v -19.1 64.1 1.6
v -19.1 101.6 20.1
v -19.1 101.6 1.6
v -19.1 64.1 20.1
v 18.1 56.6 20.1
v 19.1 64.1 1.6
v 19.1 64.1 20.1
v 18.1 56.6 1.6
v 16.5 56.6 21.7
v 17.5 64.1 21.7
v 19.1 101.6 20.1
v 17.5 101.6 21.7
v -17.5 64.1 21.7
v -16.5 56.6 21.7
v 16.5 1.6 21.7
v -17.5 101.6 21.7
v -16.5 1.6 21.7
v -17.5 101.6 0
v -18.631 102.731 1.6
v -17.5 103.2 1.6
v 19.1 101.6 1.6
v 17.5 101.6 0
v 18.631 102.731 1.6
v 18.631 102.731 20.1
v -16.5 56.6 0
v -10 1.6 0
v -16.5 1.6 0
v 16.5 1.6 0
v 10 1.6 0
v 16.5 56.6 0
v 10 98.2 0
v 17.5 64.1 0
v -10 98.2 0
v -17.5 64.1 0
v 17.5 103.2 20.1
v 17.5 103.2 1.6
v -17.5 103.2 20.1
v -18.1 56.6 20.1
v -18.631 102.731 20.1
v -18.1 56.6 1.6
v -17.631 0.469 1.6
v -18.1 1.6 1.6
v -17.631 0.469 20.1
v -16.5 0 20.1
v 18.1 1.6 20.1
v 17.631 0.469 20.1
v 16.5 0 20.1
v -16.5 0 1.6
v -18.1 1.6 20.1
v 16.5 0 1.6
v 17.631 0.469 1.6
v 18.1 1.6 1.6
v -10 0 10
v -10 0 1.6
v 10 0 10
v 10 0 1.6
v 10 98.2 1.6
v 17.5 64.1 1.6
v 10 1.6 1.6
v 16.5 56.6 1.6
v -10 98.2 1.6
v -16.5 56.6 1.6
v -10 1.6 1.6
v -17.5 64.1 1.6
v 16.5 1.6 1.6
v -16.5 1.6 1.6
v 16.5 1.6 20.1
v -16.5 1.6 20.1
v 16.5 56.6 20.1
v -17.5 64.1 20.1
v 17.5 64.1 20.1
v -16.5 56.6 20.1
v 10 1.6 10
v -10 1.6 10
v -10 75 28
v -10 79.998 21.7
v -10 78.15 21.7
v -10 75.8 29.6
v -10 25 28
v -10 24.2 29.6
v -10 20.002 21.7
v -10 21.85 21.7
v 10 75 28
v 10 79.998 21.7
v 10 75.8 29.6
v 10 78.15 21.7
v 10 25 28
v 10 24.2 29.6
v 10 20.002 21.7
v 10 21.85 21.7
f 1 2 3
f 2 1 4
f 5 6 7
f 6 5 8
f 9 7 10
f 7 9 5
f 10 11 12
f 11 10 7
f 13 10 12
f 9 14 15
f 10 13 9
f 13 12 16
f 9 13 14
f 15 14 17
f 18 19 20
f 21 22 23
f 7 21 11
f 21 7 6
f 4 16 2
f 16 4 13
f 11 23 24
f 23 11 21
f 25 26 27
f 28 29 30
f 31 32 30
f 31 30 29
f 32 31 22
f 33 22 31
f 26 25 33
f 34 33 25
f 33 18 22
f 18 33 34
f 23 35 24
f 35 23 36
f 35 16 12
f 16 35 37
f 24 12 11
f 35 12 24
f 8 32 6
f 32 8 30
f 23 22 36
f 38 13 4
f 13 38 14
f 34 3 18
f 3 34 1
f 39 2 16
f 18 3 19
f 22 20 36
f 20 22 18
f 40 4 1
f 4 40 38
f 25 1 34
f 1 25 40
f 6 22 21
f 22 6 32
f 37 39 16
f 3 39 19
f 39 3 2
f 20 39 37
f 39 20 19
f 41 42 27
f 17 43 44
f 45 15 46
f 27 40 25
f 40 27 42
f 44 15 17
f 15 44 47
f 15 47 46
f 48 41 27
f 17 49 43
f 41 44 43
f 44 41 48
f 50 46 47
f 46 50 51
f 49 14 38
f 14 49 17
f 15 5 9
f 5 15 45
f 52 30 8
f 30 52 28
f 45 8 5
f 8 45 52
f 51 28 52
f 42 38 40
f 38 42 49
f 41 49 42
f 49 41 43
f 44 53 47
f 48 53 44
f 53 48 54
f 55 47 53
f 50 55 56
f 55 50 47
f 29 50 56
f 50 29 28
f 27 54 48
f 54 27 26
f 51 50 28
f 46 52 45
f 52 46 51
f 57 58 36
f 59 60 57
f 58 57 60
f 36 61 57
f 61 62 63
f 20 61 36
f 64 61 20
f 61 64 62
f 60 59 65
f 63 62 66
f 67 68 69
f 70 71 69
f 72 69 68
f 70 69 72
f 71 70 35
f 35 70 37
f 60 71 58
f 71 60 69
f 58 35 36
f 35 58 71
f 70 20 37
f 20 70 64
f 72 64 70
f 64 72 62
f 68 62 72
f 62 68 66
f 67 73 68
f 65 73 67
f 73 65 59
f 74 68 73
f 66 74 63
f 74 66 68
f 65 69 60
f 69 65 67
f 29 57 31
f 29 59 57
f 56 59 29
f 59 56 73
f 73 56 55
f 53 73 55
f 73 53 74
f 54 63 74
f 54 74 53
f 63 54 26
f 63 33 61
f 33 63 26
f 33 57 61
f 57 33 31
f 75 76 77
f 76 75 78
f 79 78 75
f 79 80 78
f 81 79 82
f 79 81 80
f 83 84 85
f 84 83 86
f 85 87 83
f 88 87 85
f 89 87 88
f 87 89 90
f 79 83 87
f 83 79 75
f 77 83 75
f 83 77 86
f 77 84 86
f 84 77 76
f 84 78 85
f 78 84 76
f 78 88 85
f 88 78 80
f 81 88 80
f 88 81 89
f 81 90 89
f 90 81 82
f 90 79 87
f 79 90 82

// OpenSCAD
// Width of multi-tool towards the bottom (narrow end), with included clearance.
narrow_end_width = 33;

// Width of multi-tool towards the top (wider end), with included clearance.
wide_end_width = 35;

// How high up to start transitioning from narrow to wide.
transition_start_height = 55;

// How high up to finish transitioning to the wider width.
transition_end_height = 62.5;

// Full height of the hole for the holster (may be shorter than the multi tool).
full_height = 100;

// Leave enough room to account for sagging bridges.
multitool_thickness = 18.5;

slot_width = 20;

// How much should the slot cut into the bottom?
slot_depth = 10;

// Leave a connected strip across the top of the finger gap for strength.
slot_strip_height = 5;

// An integer multiple of your perimeter width is a good idea.
wall_thickness = 1.6;

belt_loop_width = 20;
belt_loop_height = 50;

// Thickness of your belt, plus a little.
belt_loop_clearance = 6.3;

// The angle from vertical the belt loop top and bottom walls will slant out at. Keep this under 45 degrees if you want to print without supports.
belt_loop_wall_angle = 30;

// Height of the center of the belt loop.
belt_loop_center_height = 50;

/* [Hidden] */
slop = 0.1;

module hole() {
  translate([0, 0, transition_start_height/2 + wall_thickness])
  cube([narrow_end_width, multitool_thickness, transition_start_height], center = true);

  translate([0, 0, transition_end_height + (full_height - transition_end_height)/2 + wall_thickness])
  cube([wide_end_width, multitool_thickness, full_height - transition_end_height], center = true);

  hull() {
    translate([0, 0, transition_start_height + wall_thickness + 1])
    cube([narrow_end_width, multitool_thickness, 2], center = true);

    translate([0, 0, transition_end_height + wall_thickness + 1])
    cube([wide_end_width, multitool_thickness, 2], center = true);
  }
}

module my_sphere(r) {
  rotate_extrude()
  intersection() {
    circle(r, $fn = 4);
    translate([0, -r]) square(2*r);
  }
}

module outside() {
  minkowski() {
    hole();
    my_sphere(wall_thickness, $fn = 8);
  }
}

module outline() {
  polygon(points = [
    [narrow_end_width/2, 0], 
    [narrow_end_width/2, transition_start_height],
    [wide_end_width/2, transition_end_height],
    [wide_end_width/2, full_height],
    [-wide_end_width/2, full_height],
    [-wide_end_width/2, transition_end_height],
    [-narrow_end_width/2, transition_start_height],
    [-narrow_end_width/2, 0]]);
}

module hole() {
  translate([0, wall_thickness, wall_thickness])
  linear_extrude(height=multitool_thickness, convexity = 5) outline();
}


module slot() {
  slot_height = full_height + 2*wall_thickness - slot_strip_height;
  translate([0, slot_height/2 - slop, 0])
  cube([slot_width, slot_height + 2*slop, 2*slot_depth], center = true);
}

module belt_loop_outline() {
  s = sin(belt_loop_wall_angle);
  c = cos(belt_loop_wall_angle);
  x = belt_loop_height/2;
  y = belt_loop_clearance;
  polygon(points=[
    [-x - s*y, 0],
    [-x, y],
    [x, y],
    [x + s*y, 0],
    [x + s*y + wall_thickness/c, 0],
    [x + s*wall_thickness, y + wall_thickness],
    [-(x + s*wall_thickness), y + wall_thickness],    
    [-(x + s*y + wall_thickness/c), 0]]);
}

module belt_loop() {
  translate([0, belt_loop_center_height, 2*wall_thickness + multitool_thickness])
  rotate([90, 0, 90])
  translate([0, 0, -belt_loop_width/2])
  linear_extrude(height = belt_loop_width)
  belt_loop_outline();
}

  
difference() {
  outside();
  hole();

  translate([0, full_height + wall_thickness, multitool_thickness/2 + wall_thickness])
  cube([wide_end_width, 3*wall_thickness, multitool_thickness], center = true);

  slot();
}

belt_loop();
